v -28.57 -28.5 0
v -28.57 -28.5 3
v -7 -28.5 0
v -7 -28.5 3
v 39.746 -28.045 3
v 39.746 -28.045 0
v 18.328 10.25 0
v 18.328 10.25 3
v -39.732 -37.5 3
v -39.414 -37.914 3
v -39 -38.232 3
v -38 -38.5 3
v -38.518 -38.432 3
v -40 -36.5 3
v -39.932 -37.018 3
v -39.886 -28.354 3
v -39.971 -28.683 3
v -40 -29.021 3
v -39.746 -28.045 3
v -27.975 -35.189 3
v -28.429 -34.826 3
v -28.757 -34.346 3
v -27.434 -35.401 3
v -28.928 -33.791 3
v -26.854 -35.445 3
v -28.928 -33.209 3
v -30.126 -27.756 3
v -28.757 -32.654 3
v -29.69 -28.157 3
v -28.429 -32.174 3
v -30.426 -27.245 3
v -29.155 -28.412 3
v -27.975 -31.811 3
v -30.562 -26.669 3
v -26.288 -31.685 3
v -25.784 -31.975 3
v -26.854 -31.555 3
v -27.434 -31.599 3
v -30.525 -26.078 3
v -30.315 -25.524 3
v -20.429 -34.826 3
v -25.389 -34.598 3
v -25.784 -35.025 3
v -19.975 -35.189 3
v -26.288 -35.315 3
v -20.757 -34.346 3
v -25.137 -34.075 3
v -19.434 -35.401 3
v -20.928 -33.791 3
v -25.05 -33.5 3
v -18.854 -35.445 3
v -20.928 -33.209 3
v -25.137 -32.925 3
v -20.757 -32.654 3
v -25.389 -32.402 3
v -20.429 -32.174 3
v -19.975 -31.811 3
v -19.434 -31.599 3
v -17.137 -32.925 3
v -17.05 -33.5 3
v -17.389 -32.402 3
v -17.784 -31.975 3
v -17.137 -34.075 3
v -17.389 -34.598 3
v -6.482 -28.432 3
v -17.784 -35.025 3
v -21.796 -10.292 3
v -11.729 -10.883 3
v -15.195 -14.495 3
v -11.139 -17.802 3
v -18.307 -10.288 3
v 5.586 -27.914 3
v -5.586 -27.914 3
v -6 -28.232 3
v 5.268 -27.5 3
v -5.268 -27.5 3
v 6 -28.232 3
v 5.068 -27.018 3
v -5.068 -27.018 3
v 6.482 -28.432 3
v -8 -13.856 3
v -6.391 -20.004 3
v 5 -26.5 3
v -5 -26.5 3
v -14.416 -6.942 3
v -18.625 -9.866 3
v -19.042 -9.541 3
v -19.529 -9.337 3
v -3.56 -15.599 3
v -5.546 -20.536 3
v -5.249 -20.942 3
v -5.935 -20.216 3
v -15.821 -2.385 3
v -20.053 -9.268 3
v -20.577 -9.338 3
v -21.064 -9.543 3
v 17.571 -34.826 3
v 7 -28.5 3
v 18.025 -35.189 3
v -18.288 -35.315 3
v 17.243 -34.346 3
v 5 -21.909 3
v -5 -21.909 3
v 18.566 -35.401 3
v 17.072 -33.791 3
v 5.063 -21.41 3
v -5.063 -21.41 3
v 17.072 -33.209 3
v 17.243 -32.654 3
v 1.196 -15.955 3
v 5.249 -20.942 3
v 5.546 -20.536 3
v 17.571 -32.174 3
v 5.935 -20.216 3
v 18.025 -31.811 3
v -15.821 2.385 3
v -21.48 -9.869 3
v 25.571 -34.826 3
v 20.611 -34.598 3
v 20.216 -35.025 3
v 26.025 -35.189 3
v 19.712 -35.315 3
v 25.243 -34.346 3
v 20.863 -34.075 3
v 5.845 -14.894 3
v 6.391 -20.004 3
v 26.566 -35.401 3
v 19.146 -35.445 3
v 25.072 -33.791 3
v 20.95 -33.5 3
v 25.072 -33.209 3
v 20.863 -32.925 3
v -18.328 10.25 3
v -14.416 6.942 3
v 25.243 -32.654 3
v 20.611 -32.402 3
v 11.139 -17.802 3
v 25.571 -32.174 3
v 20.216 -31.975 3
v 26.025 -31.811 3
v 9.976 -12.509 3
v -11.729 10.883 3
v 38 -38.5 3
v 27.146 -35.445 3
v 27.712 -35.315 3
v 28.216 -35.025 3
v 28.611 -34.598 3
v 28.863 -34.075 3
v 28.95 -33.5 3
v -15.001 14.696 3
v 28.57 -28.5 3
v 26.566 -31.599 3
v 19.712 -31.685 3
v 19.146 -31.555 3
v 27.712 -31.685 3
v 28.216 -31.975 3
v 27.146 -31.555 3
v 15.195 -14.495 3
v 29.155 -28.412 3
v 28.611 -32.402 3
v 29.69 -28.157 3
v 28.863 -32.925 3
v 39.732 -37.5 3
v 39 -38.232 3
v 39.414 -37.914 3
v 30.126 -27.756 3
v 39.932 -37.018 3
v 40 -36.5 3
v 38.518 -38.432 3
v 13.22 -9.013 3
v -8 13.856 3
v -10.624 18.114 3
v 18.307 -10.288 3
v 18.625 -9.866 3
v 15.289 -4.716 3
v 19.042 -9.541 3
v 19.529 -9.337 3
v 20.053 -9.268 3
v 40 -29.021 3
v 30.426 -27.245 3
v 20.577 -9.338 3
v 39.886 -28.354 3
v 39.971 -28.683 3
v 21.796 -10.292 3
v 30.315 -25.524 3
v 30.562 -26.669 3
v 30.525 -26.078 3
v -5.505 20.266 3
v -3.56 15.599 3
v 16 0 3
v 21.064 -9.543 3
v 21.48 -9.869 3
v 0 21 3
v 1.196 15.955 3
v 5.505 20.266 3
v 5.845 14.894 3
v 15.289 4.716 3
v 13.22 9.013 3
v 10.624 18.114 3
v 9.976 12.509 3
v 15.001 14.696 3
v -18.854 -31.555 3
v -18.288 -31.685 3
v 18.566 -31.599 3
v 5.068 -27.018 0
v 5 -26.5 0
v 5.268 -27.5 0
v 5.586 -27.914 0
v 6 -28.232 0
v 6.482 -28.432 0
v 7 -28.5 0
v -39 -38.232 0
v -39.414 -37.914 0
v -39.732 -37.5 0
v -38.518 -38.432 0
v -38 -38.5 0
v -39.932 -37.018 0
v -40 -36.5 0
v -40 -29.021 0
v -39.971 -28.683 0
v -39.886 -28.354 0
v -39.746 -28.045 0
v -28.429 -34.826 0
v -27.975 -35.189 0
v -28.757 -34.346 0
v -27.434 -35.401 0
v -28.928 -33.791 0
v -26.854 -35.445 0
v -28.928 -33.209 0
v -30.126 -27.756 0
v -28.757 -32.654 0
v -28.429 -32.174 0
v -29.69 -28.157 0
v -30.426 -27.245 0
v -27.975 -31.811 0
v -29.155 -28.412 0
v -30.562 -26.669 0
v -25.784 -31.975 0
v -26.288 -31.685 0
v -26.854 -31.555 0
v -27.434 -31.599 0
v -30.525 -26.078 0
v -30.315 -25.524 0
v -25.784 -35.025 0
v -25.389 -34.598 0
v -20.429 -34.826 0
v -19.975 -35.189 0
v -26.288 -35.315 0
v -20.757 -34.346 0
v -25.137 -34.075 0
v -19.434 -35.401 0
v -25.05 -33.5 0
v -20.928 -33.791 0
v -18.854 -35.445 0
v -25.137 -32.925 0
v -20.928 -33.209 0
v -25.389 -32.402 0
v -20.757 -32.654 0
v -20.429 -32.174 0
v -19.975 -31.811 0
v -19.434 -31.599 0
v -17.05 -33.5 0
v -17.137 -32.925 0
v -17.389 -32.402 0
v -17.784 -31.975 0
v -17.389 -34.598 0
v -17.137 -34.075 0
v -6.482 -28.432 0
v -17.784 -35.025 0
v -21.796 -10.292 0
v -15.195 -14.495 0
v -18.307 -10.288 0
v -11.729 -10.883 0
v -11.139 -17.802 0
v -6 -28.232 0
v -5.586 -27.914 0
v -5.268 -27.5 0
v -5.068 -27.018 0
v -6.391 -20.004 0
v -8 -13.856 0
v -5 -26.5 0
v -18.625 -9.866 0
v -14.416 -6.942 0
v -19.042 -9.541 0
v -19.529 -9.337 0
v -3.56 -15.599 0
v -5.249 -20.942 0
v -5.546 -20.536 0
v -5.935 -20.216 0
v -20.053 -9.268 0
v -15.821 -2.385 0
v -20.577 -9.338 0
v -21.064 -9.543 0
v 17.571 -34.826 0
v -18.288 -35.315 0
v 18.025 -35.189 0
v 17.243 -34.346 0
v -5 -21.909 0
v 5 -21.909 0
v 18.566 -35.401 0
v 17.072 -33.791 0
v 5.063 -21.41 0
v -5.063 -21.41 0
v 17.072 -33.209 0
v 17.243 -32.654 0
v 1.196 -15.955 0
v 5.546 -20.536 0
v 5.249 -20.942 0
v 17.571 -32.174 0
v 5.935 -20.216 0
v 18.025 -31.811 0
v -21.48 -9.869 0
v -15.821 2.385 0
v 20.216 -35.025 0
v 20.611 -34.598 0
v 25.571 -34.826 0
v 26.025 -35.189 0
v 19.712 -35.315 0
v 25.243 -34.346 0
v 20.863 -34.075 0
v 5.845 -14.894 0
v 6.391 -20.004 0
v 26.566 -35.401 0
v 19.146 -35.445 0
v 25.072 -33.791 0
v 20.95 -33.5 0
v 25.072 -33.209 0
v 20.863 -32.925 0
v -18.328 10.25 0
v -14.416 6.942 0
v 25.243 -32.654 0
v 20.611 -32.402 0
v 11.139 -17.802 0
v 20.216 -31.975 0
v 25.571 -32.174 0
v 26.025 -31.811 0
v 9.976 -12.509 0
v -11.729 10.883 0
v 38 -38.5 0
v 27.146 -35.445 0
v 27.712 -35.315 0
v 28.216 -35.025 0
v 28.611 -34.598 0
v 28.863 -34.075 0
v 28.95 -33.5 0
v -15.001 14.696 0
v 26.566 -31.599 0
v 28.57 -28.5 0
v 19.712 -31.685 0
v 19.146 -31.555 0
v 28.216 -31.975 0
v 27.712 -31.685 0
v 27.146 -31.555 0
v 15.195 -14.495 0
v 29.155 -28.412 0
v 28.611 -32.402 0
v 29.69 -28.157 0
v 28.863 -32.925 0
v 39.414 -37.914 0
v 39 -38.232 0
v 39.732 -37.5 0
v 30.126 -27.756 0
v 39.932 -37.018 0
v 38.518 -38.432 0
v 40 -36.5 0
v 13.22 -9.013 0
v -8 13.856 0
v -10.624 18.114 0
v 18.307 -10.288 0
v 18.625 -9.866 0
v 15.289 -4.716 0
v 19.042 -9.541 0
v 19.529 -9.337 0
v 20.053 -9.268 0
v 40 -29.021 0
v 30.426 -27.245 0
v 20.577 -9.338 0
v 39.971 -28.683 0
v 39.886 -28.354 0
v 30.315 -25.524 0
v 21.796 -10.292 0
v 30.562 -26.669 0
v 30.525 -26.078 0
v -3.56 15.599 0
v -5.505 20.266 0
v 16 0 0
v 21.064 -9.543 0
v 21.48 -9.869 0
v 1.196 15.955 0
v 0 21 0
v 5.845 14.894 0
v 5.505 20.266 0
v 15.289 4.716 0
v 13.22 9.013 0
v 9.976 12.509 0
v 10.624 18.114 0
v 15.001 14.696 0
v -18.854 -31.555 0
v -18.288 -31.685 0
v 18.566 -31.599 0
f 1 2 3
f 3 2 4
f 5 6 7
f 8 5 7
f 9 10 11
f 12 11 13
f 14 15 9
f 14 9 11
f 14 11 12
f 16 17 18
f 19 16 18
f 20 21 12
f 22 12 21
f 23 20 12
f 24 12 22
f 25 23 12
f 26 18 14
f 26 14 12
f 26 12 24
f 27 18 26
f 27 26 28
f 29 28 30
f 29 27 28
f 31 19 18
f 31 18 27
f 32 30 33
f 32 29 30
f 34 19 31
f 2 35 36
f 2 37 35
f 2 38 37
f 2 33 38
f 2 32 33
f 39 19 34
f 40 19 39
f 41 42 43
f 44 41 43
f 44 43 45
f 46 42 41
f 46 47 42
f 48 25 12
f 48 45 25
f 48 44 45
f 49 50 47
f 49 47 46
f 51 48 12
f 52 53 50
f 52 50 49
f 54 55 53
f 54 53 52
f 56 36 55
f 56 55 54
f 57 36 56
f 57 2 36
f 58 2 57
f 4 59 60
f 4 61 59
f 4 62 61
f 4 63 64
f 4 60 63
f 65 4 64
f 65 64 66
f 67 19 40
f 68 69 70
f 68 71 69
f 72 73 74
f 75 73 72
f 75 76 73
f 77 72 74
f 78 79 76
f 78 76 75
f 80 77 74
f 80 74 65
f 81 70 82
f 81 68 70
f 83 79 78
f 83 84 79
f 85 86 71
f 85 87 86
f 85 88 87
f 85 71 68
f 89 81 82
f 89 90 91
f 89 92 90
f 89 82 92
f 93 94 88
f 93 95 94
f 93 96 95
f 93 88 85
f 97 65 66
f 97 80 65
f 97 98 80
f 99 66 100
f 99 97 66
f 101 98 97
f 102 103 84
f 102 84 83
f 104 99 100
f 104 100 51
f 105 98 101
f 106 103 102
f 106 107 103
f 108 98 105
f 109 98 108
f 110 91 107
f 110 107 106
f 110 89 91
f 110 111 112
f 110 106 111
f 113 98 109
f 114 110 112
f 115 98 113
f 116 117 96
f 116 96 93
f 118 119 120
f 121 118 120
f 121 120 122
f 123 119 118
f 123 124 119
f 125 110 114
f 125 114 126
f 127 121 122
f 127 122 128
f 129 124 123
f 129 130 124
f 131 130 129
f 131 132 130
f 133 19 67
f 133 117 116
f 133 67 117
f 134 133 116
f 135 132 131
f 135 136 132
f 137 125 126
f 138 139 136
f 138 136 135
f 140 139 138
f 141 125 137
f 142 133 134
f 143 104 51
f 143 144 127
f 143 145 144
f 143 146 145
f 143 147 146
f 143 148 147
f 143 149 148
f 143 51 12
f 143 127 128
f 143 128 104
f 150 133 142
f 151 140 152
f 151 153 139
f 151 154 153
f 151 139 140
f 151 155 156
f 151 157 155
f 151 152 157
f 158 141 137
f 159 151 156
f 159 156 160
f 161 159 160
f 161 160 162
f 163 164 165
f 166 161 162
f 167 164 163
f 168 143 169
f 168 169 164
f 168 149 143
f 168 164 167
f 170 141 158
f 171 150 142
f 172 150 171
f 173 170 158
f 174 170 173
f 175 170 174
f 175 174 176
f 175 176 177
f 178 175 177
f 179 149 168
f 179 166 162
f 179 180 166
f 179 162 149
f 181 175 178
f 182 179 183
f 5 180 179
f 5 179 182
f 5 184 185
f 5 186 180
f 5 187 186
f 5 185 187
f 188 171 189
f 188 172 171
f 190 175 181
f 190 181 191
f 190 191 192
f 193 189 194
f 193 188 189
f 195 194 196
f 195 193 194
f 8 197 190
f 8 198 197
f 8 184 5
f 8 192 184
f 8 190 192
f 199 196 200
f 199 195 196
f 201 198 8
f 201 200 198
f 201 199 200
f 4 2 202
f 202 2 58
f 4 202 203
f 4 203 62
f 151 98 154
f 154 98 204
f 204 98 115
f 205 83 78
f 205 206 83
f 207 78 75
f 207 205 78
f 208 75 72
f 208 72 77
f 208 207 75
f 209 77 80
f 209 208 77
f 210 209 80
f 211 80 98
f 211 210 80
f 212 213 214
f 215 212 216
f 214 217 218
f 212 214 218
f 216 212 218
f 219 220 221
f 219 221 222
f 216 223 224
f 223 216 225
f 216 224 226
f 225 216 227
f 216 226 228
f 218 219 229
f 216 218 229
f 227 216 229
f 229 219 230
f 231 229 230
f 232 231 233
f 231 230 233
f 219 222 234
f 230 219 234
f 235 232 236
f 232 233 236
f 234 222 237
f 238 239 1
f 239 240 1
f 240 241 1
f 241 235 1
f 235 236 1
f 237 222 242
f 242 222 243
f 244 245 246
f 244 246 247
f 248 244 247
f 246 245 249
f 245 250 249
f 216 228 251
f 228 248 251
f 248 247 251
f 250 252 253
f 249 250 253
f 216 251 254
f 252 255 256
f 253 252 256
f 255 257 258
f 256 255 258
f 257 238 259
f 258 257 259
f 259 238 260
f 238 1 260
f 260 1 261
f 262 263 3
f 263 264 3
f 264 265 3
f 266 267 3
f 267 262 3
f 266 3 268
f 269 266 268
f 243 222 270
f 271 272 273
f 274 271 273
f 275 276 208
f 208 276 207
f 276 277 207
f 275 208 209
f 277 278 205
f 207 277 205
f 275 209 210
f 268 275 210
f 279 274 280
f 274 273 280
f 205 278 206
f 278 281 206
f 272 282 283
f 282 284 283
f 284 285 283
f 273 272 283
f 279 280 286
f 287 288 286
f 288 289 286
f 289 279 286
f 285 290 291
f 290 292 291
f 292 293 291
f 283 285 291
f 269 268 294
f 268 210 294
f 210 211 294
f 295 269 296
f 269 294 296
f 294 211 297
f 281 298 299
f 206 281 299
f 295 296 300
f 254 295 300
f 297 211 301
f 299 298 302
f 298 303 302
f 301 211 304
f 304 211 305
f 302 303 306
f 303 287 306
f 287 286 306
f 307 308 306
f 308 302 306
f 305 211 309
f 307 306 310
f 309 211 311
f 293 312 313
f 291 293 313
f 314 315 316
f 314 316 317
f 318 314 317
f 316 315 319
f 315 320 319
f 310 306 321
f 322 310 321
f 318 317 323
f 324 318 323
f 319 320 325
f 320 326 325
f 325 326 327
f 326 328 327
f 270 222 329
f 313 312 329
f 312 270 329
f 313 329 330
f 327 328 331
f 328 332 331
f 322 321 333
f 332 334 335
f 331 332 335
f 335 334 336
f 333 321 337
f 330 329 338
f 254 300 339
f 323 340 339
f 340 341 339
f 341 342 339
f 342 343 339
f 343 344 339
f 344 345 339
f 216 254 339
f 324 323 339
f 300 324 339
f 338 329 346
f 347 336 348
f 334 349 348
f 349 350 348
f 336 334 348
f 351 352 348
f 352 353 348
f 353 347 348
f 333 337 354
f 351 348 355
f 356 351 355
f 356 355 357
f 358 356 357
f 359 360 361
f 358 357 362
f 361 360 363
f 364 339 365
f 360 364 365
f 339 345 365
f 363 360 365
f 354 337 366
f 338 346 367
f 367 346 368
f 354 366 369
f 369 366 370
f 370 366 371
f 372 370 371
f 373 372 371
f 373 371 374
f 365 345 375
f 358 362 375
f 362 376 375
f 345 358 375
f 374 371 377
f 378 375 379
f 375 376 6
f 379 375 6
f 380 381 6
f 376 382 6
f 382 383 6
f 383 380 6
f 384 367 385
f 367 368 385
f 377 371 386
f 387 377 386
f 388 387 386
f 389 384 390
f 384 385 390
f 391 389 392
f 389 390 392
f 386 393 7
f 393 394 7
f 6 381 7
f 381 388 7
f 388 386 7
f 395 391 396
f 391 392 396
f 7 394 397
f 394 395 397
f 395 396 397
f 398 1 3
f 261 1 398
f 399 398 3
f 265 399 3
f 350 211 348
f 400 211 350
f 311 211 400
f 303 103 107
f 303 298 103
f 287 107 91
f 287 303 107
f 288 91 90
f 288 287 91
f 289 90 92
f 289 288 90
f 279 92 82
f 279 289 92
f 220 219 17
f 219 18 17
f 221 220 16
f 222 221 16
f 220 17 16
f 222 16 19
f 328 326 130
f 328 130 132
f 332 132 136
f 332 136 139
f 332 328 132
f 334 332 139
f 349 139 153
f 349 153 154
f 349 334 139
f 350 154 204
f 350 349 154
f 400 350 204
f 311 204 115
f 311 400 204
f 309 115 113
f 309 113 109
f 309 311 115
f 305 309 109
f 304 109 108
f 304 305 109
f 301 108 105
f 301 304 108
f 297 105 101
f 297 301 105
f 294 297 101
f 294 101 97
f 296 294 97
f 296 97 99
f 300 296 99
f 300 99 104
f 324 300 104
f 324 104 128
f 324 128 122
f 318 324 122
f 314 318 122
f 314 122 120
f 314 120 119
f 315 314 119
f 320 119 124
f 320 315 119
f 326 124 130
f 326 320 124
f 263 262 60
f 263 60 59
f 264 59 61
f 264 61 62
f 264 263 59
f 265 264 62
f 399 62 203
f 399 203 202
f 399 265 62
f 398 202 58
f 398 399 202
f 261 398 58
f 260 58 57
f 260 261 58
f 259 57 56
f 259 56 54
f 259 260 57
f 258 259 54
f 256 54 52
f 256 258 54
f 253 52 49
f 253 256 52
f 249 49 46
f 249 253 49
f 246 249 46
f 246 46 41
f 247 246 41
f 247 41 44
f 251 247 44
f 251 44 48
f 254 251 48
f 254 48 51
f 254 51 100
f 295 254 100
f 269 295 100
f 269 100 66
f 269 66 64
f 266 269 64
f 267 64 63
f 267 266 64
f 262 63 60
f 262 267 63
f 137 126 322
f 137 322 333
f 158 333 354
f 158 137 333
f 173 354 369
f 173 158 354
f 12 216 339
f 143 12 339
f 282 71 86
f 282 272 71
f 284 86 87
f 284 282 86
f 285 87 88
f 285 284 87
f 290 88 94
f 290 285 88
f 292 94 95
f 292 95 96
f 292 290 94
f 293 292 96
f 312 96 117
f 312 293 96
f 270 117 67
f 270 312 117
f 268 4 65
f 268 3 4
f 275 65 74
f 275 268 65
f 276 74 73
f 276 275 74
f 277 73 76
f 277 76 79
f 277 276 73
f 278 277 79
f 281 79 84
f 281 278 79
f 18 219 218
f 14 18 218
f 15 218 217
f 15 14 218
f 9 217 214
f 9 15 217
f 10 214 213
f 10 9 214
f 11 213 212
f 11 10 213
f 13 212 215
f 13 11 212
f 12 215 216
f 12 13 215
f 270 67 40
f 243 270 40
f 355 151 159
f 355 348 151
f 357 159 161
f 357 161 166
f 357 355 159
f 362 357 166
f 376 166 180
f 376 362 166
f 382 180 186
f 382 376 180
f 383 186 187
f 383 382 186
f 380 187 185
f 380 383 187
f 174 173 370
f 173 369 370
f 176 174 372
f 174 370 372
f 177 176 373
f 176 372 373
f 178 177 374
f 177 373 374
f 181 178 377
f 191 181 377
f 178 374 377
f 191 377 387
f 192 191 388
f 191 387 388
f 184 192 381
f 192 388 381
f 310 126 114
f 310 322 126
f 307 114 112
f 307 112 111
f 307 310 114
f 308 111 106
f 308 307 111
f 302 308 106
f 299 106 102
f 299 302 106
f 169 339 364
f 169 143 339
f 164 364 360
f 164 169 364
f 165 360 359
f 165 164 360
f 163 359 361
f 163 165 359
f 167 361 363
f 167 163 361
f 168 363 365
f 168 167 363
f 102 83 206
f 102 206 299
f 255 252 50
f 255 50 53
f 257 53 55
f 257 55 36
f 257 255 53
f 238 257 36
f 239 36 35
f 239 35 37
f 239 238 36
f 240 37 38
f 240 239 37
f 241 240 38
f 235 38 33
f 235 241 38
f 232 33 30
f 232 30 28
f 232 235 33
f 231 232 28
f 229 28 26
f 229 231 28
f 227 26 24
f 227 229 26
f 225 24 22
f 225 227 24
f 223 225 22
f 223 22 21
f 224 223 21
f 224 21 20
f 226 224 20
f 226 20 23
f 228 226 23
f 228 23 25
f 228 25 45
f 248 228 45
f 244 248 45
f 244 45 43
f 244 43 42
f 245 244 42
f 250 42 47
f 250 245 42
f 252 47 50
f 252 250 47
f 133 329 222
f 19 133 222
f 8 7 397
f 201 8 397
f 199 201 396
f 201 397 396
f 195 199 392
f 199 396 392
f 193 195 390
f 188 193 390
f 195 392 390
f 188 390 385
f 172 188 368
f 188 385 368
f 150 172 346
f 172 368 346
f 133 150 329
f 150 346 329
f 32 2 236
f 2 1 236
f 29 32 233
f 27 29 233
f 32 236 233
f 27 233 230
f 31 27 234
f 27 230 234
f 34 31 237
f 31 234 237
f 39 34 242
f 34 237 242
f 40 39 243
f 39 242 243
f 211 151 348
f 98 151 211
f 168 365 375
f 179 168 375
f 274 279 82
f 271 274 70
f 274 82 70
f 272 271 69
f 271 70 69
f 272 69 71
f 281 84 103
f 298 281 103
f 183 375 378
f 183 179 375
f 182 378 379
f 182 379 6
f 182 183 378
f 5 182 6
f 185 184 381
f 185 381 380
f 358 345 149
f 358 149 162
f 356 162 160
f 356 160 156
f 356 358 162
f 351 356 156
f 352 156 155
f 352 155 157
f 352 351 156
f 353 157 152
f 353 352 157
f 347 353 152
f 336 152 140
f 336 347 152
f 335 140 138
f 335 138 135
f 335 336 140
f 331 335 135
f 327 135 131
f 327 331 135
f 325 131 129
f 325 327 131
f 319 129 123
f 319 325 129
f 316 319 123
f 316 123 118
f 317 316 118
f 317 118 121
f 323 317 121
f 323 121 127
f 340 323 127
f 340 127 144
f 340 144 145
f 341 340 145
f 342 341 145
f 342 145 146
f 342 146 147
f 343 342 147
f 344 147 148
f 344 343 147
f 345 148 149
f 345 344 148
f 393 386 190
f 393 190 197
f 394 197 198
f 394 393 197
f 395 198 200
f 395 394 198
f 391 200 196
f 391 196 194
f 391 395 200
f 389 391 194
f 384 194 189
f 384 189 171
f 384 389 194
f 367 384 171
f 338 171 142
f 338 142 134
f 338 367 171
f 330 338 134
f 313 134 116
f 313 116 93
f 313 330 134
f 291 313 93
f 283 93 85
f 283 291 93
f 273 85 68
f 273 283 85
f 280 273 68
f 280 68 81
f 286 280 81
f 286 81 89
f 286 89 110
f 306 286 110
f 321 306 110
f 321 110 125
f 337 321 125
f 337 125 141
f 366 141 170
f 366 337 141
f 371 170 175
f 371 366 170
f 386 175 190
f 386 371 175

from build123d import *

# Parameters (mm, degrees)
SKETCH_1_R          = 16
SKETCH_1_R_2        = 1.95
EXTRUDE_1_DEPTH     = 3
CUT_EXTRUDE_1_DEPTH = 56.599010783
FILLET_1_R          = 2


with BuildPart() as part:
    # 草图1 → 凸台-拉伸1 (new body)
    with BuildSketch(Plane.XY):
        with BuildLine():
            Line((-40, -28.5), (-40, -38.5))
            Line((-40, -38.5), (40, -38.5))
            Line((40, -38.5), (40, -28.5))
            Line((40, -28.5), (18.328389928, 10.250371829))
            ThreePointArc((18.328389928, 10.250371829), (0, 21), (-18.328389928, 10.250371829))
            Line((-18.328389928, 10.250371829), (-40, -28.5))
        make_face()
        Circle(SKETCH_1_R, mode=Mode.SUBTRACT)
        with Locations((27, -33.5)):
            Circle(SKETCH_1_R_2, mode=Mode.SUBTRACT)
        with Locations((19, -33.5)):
            Circle(SKETCH_1_R_2, mode=Mode.SUBTRACT)
        with Locations((-27, -33.5)):
            Circle(SKETCH_1_R_2, mode=Mode.SUBTRACT)
        with Locations((-19, -33.5)):
            Circle(SKETCH_1_R_2, mode=Mode.SUBTRACT)
    extrude(amount=EXTRUDE_1_DEPTH)

    # 草图2 → 切除-拉伸1 (cut, through all)
    with BuildSketch(Plane.XY.offset(3)):
        with BuildLine():
            Line((-31.979655574, -28.5), (-5, -28.5))
            Line((-5, -28.5), (-5, -20.396078054))
            ThreePointArc((-5, -20.396078054), (-14.160497384, -15.507427699), (-19.859102687, -6.827594046))
            Line((-19.859102687, -6.827594046), (-31.979655574, -28.5))
        make_face()
        with BuildLine():
            Line((19.859102687, -6.827594046), (31.979655574, -28.5))
            Line((31.979655574, -28.5), (5, -28.5))
            Line((5, -28.5), (5, -20.396078054))
            ThreePointArc((5, -20.396078054), (14.160497384, -15.507427699), (19.859102687, -6.827594046))
        make_face()
    extrude(amount=-CUT_EXTRUDE_1_DEPTH, mode=Mode.SUBTRACT)

    # 圆角1
    fillet_1_edges = [part.edges().sort_by_distance(p)[0] for p in [
        (40, -28.5, 1.5),
        (40, -38.5, 1.5),
        (-40, -38.5, 1.5),
        (-40, -28.5, 1.5),
        (5, -20.396078054, 1.5),
        (19.859102687, -6.827594046, 1.5),
        (31.979655574, -28.5, 1.5),
        (5, -28.5, 1.5),
        (-31.979655574, -28.5, 1.5),
        (-19.859102687, -6.827594046, 1.5),
        (-5, -20.396078054, 1.5),
        (-5, -28.5, 1.5),
    ]]
    fillet(fillet_1_edges, radius=FILLET_1_R)


solid = part.part
